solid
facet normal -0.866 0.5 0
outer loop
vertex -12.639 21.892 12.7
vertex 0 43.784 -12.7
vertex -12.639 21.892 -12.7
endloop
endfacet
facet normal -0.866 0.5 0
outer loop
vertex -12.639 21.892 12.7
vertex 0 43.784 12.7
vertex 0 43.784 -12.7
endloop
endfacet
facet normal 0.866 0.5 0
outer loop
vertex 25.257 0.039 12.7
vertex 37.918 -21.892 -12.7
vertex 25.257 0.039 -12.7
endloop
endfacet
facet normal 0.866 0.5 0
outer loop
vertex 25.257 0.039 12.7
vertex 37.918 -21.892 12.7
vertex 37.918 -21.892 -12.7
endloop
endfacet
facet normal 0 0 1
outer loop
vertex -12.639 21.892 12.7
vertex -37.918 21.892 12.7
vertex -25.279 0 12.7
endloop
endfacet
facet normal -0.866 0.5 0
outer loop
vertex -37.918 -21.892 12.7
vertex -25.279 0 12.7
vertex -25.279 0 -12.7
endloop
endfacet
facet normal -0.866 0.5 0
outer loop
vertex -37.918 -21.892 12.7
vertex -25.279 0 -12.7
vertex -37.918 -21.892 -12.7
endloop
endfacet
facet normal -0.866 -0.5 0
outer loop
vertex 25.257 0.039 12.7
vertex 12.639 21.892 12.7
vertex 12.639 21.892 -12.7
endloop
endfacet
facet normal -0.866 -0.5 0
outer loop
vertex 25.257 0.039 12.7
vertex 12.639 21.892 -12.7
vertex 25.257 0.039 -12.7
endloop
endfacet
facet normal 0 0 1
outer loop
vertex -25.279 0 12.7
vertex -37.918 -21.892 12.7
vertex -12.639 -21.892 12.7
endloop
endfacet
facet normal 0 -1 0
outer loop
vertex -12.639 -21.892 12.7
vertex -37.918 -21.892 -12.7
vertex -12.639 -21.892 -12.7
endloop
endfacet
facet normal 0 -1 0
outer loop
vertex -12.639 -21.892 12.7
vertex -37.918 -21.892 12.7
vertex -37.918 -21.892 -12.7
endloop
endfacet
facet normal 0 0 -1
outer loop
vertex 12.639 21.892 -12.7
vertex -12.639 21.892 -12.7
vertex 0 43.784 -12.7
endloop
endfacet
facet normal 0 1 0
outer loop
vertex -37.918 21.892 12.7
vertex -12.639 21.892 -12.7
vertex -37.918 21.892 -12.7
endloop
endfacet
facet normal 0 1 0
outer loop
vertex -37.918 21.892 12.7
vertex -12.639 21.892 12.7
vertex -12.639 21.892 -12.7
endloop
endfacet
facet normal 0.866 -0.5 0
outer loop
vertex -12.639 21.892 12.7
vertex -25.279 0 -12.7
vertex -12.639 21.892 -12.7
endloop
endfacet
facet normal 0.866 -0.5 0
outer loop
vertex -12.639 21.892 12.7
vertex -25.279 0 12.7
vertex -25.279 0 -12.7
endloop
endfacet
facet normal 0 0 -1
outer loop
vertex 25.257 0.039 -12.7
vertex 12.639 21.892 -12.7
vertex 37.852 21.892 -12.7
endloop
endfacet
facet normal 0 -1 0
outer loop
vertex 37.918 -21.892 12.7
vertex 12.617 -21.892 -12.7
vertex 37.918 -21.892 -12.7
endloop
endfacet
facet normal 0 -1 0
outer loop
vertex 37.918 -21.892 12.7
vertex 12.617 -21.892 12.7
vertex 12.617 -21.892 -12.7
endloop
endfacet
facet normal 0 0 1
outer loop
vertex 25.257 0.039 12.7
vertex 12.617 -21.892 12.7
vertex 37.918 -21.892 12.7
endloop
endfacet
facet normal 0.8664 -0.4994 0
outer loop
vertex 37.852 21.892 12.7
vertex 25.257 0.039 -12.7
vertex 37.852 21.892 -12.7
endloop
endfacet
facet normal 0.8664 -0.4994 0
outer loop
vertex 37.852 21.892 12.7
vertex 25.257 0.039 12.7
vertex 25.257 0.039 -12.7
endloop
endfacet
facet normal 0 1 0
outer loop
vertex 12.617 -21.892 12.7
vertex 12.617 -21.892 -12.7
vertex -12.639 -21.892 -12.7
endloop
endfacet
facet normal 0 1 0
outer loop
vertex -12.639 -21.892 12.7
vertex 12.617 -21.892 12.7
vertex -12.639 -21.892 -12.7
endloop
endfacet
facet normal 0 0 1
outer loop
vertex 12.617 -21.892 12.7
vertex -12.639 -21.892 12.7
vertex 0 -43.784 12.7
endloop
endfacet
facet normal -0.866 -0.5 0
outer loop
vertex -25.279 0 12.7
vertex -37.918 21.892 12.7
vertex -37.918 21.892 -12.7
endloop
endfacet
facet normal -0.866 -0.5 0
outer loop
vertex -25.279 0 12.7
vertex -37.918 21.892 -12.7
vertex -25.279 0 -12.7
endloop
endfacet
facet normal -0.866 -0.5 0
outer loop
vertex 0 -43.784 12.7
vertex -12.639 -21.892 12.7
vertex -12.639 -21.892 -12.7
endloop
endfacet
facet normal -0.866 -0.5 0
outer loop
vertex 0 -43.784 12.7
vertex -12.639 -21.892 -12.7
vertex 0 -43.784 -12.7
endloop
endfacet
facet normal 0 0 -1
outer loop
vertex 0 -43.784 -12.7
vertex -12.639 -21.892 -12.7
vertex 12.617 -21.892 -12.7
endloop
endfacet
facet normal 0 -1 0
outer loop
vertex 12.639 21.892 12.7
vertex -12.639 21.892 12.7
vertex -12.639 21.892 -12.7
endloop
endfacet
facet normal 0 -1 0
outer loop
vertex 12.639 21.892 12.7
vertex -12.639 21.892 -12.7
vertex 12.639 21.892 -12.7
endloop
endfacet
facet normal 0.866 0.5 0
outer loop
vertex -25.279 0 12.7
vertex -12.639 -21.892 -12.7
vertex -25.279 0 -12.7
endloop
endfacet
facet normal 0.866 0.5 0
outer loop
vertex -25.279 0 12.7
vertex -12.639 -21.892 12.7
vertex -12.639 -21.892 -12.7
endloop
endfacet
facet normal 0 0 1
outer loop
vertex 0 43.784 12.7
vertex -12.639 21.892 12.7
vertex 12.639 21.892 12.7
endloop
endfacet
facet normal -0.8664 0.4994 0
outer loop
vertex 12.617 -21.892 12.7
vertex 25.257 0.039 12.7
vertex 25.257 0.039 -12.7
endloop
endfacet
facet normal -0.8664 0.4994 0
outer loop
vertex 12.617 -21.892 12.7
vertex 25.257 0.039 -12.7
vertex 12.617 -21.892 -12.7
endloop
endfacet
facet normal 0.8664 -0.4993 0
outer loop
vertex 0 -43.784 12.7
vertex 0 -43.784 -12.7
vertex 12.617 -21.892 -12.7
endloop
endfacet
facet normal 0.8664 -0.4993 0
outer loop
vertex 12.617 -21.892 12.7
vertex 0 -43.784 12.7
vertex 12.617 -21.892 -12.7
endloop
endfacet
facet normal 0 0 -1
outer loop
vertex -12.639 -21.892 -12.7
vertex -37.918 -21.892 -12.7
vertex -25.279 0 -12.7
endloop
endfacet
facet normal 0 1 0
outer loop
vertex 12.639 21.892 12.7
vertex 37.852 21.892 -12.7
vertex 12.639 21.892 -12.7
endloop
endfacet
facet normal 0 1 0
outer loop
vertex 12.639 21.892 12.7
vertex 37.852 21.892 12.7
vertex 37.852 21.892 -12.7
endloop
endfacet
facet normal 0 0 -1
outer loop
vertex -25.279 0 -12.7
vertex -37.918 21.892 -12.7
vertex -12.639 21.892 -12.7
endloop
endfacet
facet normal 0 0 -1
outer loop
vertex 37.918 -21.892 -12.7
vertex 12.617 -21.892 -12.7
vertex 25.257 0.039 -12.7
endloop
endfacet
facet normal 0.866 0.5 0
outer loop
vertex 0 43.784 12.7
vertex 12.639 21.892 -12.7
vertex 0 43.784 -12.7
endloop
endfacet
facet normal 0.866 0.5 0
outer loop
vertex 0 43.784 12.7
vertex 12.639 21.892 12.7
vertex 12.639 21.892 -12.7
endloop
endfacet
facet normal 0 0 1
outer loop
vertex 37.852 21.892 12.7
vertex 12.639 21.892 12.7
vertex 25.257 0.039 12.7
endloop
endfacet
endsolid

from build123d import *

# Parameters (mm, degrees)
F2_DEPTH = 12.7


with BuildPart() as f2:
    # F1 (on Top) → F2 (new body, symmetric)
    with BuildSketch(Plane.XY):
        Polygon((37.9182917739, -21.8921359628), (25.2565930498, 0.0385695373), (12.6171820573, -21.8921359628), align=None)
    extrude(amount=F2_DEPTH, both=True)


with BuildPart() as f2b:
    # F1 (on Top) → F2, piece 2 (new body, symmetric)
    with BuildSketch(Plane.XY):
        Polygon((37.8515461718, 21.8921359628), (12.6394305913, 21.8921359628), (25.2565930498, 0.0385695373), align=None)
    extrude(amount=F2_DEPTH, both=True)


with BuildPart() as f2c:
    # F1 (on Top) → F2, piece 3 (new body, symmetric)
    with BuildSketch(Plane.XY):
        Polygon((0, 43.7842719257), (-12.6394305913, 21.8921359628), (12.6394305913, 21.8921359628), align=None)
    extrude(amount=F2_DEPTH, both=True)


with BuildPart() as f2d:
    # F1 (on Top) → F2, piece 4 (new body, symmetric)
    with BuildSketch(Plane.XY):
        Polygon((-12.6394305913, 21.8921359628), (-37.9182917739, 21.8921359628), (-25.2788611826, 0), align=None)
    extrude(amount=F2_DEPTH, both=True)


with BuildPart() as f2e:
    # F1 (on Top) → F2, piece 5 (new body, symmetric)
    with BuildSketch(Plane.XY):
        Polygon((-12.6394305913, -21.8921359628), (-25.2788611826, 0), (-37.9182917739, -21.8921359628), align=None)
    extrude(amount=F2_DEPTH, both=True)


with BuildPart() as f2f:
    # F1 (on Top) → F2, piece 6 (new body, symmetric)
    with BuildSketch(Plane.XY):
        Polygon((12.6171820573, -21.8921359628), (-12.6394305913, -21.8921359628), (0, -43.7842719257), align=None)
    extrude(amount=F2_DEPTH, both=True)


solid = Compound([f2.part, f2b.part, f2c.part, f2d.part, f2e.part, f2f.part])
